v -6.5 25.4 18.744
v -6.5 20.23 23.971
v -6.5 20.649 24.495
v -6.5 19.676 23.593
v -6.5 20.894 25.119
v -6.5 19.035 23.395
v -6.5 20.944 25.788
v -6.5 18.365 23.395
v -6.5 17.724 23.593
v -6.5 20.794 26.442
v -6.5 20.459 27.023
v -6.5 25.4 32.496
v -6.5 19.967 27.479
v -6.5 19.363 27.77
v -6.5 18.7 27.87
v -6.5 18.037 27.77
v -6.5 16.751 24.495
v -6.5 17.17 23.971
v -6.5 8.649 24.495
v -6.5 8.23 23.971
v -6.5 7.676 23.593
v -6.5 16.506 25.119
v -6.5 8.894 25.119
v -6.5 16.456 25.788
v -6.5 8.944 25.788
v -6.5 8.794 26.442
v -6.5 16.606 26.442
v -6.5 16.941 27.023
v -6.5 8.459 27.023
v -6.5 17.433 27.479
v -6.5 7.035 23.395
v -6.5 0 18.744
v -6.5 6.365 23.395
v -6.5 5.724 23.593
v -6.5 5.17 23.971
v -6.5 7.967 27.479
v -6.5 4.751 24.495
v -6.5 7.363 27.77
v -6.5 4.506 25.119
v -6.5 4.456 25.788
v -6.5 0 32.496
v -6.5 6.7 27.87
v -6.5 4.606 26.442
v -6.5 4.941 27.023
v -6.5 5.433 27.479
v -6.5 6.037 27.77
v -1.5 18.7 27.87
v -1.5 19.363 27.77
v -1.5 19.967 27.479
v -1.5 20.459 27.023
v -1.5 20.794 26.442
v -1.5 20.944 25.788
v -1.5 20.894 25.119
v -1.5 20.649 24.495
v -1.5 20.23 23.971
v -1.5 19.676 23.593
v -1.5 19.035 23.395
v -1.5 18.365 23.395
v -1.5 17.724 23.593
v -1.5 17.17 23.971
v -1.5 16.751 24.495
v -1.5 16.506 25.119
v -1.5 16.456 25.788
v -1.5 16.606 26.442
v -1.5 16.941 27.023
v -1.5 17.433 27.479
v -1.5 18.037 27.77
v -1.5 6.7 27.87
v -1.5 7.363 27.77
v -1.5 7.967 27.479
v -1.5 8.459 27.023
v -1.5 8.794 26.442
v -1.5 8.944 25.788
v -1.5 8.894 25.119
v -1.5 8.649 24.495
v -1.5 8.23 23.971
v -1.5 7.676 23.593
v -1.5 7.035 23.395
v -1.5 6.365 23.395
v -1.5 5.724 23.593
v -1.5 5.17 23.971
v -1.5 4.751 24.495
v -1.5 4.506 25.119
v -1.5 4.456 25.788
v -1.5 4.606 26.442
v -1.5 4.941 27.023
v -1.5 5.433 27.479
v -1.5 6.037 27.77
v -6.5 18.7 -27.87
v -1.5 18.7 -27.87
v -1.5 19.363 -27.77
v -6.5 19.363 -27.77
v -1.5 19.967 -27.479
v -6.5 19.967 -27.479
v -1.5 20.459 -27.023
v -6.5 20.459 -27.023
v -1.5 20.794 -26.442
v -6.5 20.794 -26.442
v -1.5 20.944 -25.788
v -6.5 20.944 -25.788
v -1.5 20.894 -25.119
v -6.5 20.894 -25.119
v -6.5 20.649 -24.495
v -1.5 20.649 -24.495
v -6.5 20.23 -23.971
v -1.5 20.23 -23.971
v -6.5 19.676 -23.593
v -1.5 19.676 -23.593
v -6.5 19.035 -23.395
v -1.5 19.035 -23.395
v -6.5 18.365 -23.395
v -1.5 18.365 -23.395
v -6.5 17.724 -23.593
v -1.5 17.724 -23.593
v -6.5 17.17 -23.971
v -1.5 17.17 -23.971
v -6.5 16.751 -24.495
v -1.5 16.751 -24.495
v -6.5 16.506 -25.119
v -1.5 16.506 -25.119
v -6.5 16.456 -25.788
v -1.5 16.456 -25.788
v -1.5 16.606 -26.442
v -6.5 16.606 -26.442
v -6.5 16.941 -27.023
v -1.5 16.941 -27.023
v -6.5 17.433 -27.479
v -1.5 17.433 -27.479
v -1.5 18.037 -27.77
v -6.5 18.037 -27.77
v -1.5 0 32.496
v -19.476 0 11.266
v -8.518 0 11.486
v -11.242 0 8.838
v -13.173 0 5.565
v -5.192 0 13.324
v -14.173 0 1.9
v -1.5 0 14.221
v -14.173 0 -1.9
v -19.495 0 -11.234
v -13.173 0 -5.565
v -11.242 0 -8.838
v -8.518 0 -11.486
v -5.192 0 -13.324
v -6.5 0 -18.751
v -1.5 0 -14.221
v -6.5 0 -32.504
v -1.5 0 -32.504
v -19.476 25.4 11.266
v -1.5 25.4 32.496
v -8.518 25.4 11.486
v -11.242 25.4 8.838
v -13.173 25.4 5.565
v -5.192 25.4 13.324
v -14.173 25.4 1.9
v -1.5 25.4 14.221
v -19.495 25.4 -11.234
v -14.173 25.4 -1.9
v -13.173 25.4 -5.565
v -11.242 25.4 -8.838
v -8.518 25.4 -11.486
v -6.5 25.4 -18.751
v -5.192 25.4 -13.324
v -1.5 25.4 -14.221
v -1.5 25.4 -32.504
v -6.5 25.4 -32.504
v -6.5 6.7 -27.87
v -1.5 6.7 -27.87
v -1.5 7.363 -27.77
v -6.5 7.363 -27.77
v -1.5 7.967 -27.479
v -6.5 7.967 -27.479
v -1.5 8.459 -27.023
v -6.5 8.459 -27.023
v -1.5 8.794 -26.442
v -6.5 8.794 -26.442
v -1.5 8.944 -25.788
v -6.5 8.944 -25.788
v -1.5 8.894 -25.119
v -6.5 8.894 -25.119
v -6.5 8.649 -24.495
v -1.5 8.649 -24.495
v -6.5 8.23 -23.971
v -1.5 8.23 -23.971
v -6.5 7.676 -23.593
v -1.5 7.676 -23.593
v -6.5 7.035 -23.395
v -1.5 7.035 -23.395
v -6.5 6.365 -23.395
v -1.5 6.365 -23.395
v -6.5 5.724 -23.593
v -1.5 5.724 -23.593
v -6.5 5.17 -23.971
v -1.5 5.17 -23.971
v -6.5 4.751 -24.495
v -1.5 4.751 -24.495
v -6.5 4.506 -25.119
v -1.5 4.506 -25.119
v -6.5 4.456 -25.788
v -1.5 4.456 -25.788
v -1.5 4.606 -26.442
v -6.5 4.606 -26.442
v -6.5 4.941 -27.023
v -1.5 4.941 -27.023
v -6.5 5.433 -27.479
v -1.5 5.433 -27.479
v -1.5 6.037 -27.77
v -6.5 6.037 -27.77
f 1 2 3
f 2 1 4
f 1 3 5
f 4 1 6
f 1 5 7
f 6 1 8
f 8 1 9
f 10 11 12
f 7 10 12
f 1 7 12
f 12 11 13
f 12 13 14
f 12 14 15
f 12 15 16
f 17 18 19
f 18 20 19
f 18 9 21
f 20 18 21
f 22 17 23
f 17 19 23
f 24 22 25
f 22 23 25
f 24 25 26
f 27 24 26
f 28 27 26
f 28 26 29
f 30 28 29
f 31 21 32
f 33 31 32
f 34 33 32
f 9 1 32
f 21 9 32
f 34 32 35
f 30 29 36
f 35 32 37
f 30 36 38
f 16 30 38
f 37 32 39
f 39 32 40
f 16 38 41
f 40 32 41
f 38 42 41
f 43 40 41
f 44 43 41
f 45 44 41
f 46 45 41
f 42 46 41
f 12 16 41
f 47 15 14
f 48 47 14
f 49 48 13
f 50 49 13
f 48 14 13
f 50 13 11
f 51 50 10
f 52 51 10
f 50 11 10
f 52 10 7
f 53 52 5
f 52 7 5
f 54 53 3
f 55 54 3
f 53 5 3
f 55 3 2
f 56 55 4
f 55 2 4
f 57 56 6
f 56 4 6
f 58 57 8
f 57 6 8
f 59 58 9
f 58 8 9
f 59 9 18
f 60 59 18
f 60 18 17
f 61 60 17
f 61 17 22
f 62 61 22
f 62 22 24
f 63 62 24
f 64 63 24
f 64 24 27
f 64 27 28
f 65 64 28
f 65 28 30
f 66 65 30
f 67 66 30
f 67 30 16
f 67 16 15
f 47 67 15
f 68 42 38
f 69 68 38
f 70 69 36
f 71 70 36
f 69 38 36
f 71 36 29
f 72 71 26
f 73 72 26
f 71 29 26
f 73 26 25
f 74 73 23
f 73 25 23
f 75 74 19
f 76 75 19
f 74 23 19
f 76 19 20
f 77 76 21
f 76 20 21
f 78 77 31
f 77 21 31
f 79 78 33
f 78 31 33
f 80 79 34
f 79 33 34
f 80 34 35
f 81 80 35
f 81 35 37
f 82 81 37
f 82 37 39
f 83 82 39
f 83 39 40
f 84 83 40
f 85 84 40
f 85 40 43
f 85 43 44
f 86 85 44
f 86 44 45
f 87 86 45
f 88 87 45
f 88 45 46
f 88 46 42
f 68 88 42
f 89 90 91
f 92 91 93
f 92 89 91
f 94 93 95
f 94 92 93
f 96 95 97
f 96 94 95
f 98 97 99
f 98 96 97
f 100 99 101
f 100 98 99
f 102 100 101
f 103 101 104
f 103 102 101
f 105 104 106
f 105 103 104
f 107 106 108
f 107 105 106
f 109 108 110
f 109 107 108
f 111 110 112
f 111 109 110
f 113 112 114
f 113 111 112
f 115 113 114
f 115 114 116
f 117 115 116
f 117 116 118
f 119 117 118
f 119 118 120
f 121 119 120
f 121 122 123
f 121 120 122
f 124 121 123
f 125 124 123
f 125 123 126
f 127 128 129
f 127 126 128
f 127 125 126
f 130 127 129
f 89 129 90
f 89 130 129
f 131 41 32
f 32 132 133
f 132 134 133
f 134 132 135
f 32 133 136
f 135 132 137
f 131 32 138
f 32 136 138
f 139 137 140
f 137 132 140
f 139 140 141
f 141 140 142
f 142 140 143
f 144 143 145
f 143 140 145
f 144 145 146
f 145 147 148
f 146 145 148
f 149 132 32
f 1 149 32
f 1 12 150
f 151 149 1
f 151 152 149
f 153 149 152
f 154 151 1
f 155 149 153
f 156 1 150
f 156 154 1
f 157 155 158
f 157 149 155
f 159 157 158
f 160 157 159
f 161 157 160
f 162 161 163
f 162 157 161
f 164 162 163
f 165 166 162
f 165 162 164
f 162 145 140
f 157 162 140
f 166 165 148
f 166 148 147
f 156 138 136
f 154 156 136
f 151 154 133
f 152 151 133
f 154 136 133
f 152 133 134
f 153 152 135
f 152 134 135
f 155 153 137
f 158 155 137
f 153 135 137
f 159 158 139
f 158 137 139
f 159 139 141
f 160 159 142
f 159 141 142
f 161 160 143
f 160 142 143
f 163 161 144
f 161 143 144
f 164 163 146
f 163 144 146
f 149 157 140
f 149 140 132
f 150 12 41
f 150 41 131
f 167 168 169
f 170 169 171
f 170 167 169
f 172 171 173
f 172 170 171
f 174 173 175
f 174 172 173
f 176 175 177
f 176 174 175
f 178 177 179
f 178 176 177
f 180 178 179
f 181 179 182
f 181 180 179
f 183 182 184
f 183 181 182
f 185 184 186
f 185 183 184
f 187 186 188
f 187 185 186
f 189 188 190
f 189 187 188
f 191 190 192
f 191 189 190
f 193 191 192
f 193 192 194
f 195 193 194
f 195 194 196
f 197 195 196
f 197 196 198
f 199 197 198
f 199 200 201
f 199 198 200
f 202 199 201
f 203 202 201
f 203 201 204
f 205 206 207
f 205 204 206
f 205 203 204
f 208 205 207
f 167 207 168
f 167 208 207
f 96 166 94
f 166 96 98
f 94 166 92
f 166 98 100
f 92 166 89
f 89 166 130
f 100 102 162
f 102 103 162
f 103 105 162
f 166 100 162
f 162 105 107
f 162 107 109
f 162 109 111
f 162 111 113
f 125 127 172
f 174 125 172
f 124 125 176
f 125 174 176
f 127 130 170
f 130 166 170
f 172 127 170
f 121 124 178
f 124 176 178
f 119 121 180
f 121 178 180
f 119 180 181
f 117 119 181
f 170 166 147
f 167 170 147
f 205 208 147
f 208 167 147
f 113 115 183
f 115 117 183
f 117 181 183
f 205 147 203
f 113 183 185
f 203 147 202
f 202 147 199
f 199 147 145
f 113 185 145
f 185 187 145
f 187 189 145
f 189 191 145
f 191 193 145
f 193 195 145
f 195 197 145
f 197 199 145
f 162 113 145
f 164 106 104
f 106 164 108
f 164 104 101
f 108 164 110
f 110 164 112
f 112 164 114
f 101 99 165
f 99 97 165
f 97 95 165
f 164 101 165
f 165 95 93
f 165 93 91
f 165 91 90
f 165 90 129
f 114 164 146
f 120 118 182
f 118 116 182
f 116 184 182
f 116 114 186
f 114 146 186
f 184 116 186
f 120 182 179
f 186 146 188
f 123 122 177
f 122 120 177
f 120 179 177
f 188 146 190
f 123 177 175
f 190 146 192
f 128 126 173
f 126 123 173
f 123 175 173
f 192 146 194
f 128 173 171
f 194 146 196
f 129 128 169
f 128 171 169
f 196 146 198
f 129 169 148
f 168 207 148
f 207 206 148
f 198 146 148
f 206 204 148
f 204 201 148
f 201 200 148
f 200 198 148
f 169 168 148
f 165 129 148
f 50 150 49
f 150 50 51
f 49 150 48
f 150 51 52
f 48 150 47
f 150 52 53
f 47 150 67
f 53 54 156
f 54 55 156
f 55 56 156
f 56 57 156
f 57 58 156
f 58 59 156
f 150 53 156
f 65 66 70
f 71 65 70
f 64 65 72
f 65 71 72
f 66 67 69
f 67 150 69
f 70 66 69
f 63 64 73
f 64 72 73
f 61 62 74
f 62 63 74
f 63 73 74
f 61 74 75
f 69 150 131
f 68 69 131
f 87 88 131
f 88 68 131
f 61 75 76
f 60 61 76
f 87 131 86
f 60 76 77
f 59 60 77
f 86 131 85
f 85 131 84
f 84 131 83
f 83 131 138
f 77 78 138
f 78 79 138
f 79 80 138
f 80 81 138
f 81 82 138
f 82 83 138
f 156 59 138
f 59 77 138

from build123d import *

# Parameters (mm, degrees)
BOSS_EXTRUDE1_DEPTH = 25.4
SKETCH2_R           = 2.25
CUT_EXTRUDE1_DEPTH  = 6


with BuildPart() as part:
    # Sketch1 → Boss-Extrude1 (new body)
    with BuildSketch(Plane(origin=(0, 0, 0), x_dir=(1, 0, 0), z_dir=(0, 1, 0))):
        Polygon((-6.5, 18.750739811), (-1.5, 21.642901866), (-1.5, 32.503507515), (-6.5, 32.503507515), align=None)
        with BuildLine():
            Line((-1.5, -21.625070485), (-1.5, -14.221111068))
            ThreePointArc((-1.5, -14.221111068), (-14.3, 0), (-1.5, 14.221111068))
            Line((-1.5, 14.221111068), (-1.5, 21.642901866))
            Line((-1.5, 21.642901866), (-6.5, 18.750739811))
            Line((-6.5, 18.750739811), (-19.494691465, 11.234189098))
            Line((-19.494691465, 11.234189098), (-19.476438882, -11.265803499))
            Line((-19.476438882, -11.265803499), (-6.5, -18.743724782))
            Line((-6.5, -18.743724782), (-1.5, -21.625070485))
        make_face()
        Polygon((-1.5, -32.496492485), (-1.5, -21.625070485), (-6.5, -18.743724782), (-6.5, -32.496492485), align=None)
    extrude(amount=BOSS_EXTRUDE1_DEPTH)

    # Sketch2 → Cut-Extrude1 (cut, through all)
    with BuildSketch(Plane.ZY.offset(6.5)):
        with Locations((25.620108634, 18.7)):
            Circle(SKETCH2_R)
        with Locations((25.620108634, 6.7)):
            Circle(SKETCH2_R)
    cut_extrude1 = extrude(amount=-CUT_EXTRUDE1_DEPTH, mode=Mode.SUBTRACT)

    # Mirror1: Cut-Extrude1 across plane
    add(cut_extrude1.mirror(Plane.XY), mode=Mode.SUBTRACT)


solid = part.part
